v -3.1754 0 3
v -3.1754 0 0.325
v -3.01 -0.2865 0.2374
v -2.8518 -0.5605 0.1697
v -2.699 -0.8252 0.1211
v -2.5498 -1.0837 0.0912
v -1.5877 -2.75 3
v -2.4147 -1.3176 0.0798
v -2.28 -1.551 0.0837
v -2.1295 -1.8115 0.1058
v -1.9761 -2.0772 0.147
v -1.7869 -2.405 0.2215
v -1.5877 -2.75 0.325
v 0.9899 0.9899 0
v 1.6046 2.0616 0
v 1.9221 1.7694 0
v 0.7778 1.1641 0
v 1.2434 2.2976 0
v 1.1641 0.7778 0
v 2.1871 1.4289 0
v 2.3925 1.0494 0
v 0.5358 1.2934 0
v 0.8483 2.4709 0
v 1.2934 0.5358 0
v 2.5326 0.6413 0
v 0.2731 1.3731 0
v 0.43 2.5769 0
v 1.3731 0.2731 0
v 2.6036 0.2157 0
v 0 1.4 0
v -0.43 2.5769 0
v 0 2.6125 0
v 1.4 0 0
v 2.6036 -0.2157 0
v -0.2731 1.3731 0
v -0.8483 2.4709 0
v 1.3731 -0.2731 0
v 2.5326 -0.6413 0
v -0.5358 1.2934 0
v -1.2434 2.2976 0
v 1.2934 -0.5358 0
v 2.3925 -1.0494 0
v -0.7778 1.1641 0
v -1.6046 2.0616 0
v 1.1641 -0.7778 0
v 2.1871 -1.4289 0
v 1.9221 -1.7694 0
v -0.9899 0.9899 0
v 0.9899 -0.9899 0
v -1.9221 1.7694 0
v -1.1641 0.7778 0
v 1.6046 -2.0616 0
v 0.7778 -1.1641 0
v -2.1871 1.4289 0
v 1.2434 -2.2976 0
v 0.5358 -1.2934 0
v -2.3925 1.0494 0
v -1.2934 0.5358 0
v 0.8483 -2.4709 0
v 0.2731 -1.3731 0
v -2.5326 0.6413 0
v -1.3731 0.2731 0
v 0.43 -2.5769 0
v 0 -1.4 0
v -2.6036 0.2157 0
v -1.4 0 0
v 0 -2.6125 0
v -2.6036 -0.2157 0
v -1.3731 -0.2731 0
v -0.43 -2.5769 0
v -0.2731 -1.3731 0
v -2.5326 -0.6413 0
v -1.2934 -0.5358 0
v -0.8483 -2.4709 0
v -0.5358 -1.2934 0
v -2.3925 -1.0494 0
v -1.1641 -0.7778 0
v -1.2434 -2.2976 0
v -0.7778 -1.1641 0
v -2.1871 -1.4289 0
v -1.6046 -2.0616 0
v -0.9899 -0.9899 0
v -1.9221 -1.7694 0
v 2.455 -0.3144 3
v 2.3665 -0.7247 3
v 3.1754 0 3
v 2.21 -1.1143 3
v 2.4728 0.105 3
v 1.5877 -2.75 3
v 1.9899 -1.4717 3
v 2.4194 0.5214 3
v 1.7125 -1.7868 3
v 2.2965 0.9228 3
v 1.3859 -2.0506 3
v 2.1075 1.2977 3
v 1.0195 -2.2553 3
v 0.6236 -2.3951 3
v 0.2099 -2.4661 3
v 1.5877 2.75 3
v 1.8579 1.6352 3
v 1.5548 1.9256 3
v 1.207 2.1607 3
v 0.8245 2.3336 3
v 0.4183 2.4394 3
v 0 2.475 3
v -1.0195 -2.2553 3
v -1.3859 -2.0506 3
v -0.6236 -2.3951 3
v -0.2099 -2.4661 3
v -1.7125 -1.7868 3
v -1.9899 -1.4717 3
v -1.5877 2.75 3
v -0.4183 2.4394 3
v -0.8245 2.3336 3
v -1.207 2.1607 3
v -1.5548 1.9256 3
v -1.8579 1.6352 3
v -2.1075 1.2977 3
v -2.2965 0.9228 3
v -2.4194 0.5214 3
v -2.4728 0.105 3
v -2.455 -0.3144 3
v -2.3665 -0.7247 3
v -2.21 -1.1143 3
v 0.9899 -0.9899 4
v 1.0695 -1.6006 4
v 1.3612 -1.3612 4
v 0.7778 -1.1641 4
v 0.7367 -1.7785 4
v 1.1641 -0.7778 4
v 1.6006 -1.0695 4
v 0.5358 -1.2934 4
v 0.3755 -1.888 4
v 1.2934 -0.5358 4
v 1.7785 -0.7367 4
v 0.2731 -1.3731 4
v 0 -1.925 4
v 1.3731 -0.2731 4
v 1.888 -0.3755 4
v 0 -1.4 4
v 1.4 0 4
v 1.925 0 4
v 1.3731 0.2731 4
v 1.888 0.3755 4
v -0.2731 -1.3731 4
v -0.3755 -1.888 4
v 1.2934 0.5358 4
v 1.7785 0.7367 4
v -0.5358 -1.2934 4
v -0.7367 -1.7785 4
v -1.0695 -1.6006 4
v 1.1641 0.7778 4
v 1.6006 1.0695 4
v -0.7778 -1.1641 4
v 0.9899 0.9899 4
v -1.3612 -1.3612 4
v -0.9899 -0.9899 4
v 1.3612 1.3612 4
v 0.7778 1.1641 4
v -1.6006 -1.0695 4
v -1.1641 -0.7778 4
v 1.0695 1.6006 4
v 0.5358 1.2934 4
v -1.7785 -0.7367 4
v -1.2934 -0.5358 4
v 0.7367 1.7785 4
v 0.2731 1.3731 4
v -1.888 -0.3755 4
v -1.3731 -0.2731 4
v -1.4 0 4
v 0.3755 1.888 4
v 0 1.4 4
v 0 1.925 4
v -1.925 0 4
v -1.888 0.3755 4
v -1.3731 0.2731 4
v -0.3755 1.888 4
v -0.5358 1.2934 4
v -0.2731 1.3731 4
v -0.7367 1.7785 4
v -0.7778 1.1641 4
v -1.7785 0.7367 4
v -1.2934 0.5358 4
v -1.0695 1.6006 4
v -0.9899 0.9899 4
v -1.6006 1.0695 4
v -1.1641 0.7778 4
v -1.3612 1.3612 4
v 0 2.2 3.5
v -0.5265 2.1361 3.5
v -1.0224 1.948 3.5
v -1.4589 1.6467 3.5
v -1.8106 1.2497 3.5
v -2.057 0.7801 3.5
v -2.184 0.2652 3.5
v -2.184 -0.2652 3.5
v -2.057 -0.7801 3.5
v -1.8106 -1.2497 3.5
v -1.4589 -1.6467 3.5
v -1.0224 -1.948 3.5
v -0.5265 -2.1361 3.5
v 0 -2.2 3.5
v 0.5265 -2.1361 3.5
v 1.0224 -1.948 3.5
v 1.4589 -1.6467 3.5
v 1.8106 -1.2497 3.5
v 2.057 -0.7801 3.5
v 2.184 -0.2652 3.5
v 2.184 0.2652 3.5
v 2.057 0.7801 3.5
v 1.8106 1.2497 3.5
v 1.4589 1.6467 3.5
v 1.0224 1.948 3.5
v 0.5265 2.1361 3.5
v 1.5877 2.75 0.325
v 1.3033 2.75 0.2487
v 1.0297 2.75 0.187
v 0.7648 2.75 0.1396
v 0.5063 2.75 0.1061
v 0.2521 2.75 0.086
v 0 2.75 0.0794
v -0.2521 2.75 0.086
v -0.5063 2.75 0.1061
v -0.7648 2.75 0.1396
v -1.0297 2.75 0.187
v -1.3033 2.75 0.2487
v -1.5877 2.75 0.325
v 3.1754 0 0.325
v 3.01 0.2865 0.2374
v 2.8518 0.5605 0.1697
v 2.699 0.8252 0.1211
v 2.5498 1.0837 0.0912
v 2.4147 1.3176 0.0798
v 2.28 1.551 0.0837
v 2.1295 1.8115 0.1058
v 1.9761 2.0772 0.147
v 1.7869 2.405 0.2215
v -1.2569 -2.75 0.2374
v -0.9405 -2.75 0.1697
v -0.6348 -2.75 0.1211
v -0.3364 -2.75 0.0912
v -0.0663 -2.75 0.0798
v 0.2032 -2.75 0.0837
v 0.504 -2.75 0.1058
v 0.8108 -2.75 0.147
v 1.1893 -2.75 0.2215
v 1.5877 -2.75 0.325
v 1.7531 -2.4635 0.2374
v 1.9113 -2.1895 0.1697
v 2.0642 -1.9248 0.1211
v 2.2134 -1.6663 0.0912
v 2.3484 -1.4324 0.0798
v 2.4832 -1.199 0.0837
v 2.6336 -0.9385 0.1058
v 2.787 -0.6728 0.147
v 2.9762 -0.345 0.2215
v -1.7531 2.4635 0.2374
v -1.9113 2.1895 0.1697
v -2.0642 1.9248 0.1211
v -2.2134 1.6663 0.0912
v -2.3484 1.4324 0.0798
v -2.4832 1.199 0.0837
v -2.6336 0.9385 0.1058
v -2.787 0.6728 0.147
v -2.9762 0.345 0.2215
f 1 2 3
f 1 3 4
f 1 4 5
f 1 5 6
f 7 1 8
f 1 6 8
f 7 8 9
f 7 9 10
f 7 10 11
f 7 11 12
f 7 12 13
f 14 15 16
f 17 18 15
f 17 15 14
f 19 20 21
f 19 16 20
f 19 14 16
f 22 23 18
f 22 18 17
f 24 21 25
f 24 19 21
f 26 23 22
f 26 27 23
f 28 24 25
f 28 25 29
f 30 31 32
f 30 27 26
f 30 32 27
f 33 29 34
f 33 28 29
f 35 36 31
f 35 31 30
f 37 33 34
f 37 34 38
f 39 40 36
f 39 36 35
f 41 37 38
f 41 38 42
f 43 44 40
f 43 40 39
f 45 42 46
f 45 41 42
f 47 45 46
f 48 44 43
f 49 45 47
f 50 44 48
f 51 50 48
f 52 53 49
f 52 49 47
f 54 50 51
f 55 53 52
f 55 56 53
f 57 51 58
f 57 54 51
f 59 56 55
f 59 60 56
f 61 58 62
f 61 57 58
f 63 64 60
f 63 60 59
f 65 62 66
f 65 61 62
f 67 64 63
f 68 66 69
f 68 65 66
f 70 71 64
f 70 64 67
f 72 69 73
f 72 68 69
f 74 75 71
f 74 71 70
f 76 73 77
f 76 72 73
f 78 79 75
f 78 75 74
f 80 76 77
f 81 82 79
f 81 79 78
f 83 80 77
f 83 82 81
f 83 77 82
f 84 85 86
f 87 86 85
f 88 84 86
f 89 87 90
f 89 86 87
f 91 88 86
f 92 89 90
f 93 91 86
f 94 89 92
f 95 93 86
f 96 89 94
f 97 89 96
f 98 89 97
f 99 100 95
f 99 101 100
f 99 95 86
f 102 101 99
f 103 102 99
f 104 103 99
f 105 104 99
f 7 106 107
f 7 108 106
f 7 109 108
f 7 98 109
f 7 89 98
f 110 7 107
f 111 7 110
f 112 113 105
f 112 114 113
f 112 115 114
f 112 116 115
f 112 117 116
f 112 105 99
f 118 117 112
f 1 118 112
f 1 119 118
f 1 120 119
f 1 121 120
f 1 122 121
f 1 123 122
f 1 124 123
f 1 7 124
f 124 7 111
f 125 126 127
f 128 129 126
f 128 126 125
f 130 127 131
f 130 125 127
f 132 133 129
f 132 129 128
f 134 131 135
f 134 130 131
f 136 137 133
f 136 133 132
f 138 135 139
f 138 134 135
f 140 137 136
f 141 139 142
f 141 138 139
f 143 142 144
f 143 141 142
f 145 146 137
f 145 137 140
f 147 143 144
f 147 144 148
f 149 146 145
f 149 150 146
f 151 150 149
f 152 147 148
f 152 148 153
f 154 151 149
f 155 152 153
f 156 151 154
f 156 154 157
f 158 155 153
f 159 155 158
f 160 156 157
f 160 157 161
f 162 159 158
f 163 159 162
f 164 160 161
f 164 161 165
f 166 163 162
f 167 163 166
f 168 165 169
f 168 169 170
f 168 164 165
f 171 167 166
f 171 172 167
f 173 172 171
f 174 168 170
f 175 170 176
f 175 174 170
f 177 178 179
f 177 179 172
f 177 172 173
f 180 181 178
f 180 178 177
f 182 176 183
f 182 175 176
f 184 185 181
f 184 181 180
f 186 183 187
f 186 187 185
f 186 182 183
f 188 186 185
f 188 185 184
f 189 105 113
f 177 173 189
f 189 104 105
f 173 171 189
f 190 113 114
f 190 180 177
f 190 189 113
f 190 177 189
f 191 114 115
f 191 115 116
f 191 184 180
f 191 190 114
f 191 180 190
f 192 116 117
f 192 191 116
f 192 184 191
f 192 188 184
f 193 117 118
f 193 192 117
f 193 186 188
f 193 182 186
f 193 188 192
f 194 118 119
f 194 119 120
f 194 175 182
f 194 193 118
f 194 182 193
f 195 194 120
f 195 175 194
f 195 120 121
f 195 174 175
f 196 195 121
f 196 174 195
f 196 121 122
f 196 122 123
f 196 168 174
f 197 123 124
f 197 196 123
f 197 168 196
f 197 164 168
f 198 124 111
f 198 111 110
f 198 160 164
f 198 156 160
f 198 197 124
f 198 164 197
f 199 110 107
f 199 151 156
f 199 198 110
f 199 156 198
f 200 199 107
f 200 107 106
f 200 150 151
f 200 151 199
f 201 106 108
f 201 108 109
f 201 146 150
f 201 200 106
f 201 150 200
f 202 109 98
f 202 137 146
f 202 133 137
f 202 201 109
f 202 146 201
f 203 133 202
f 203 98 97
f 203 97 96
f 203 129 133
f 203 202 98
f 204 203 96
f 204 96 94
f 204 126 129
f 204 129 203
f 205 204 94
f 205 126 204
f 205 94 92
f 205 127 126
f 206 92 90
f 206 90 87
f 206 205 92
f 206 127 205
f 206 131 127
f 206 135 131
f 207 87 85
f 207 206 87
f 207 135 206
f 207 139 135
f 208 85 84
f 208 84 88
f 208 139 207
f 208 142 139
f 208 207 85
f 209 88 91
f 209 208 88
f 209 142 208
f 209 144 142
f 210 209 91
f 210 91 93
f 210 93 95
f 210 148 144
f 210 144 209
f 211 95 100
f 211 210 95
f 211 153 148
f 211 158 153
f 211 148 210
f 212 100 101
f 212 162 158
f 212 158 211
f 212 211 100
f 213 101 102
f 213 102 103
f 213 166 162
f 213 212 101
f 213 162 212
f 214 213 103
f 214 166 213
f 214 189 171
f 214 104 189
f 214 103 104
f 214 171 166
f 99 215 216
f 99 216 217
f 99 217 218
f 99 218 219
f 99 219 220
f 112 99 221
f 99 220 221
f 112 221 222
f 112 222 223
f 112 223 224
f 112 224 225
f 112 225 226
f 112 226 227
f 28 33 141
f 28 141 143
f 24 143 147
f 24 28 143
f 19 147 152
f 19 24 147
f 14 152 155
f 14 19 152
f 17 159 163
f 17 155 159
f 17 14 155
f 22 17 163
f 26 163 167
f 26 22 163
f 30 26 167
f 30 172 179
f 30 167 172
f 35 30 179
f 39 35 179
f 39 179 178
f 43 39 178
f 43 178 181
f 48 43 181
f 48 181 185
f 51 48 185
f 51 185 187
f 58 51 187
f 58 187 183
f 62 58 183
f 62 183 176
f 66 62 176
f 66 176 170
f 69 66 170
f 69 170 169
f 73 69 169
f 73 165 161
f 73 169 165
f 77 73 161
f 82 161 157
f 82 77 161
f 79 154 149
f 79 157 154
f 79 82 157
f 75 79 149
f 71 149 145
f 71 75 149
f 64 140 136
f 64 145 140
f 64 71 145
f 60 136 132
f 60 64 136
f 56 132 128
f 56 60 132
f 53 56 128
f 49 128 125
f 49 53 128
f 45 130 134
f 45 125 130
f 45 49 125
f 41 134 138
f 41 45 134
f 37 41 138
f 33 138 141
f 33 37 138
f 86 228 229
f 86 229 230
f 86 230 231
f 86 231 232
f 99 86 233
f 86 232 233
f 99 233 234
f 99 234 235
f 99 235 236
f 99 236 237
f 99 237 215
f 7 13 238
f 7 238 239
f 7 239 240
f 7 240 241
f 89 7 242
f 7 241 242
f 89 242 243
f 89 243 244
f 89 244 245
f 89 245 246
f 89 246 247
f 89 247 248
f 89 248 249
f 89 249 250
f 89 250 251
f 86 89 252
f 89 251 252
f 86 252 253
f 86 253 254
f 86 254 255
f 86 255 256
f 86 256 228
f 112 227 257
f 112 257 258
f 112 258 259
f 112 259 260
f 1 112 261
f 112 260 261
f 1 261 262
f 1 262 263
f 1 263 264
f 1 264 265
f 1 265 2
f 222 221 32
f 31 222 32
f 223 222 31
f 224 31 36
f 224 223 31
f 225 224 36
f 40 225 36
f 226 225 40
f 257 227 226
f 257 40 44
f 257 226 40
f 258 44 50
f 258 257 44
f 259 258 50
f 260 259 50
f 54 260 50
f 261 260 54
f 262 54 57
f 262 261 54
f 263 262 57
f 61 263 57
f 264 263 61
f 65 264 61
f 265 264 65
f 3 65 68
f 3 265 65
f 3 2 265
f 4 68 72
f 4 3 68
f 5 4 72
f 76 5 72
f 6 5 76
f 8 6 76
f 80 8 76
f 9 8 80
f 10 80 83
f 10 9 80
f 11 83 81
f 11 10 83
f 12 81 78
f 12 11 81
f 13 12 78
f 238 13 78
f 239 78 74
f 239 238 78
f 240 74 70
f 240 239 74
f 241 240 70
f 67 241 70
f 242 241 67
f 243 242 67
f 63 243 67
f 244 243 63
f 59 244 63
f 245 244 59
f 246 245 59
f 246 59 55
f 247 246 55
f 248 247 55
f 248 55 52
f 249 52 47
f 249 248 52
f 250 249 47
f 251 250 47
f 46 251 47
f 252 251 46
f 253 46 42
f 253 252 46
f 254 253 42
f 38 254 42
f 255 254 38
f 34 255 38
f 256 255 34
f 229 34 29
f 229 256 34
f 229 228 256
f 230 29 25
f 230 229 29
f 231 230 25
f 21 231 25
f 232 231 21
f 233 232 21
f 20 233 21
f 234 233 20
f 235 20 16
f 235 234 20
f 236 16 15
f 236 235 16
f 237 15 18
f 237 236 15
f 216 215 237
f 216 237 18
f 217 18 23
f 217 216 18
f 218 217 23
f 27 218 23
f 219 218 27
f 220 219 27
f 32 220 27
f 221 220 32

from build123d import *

# Parameters (mm, degrees)
F_0186_EXTRUDE_DEPTH        = 3
F_0186_EXTRUDE_ROTATE_ANGLE = 120
F_0185_REVOLVE_ROTATE_ANGLE = 90
F_0188_CONE_ROTATE_ANGLE    = 90
F_0191_CYLINDER_SKETCH_R    = 1.4
F_0191_CYLINDER_DEPTH       = 10


with BuildPart() as part:
    # 0186_extrude_Sketch → 0186_extrude (new body)
    with BuildSketch(Plane.XY):
        Polygon((0, 0), (3.175426481, 0), (4.763139721, 2.75), (3.175426481, 5.5), (0, 5.5), (-1.58771324, 2.75), align=None)
    extrude(amount=F_0186_EXTRUDE_DEPTH)


with BuildPart() as part_1:
    # 0186_extrude_Rotate: moved
    add(part.part.rotate(Axis((0, 0, 0), (0, 0, 1)), F_0186_EXTRUDE_ROTATE_ANGLE))


with BuildPart() as part_2:
    # 0186_extrude_Translate: moved
    add(part_1.part.moved(Location((3.175426481, 0, 0))))


with BuildPart() as body_2:
    # 0185_revolve_Sketch → 0185_revolve (revolve)
    with BuildSketch(Plane.XY, mode=Mode.PRIVATE) as f_0185_revolve_sk:
        Polygon((0, 0), (2.6125, 0), (3.675426481, 0.61368089), (3.675426481, 3), (0, 3), align=None)
    revolve(f_0185_revolve_sk.sketch.rotate(Axis((0, -100, 0), (0, 1, 0)), 90), axis=Axis((0, -100, 0), (0, 1, 0)))


with BuildPart() as body_2_1:
    # 0185_revolve_Rotate: moved
    add(body_2.part.rotate(Axis((0, 0, 0), (1, 0, 0)), F_0185_REVOLVE_ROTATE_ANGLE))


with BuildPart() as part_3:
    add(part_2.part)

    # 0187_common: intersect body 2
    add(body_2_1.part, mode=Mode.INTERSECT)


with BuildPart() as body_2_2:
    # 0188_cone_Sketch → 0188_cone (revolve)
    with BuildSketch(Plane.XY, mode=Mode.PRIVATE) as f_0188_cone_sk:
        Polygon((0, 0), (2.475, 0), (1.925, 1), (0, 1), align=None)
    revolve(f_0188_cone_sk.sketch.rotate(Axis((0, -100, 0), (0, 1, 0)), 90), axis=Axis((0, -100, 0), (0, 1, 0)))


with BuildPart() as body_2_2_1:
    # 0188_cone_Rotate: moved
    add(body_2_2.part.rotate(Axis((0, 0, 0), (1, 0, 0)), F_0188_CONE_ROTATE_ANGLE))


with BuildPart() as body_2_2_2:
    # 0188_cone_Translate: moved
    add(body_2_2_1.part.moved(Location((0, 0, 3))))


with BuildPart() as part_4:
    add(part_3.part)

    # 0190_add: union body 2 2
    add(body_2_2_2.part)


with BuildPart() as body_2_3:
    # 0191_cylinder_Sketch → 0191_cylinder (new body)
    with BuildSketch(Plane.XY):
        Circle(F_0191_CYLINDER_SKETCH_R)
    extrude(amount=F_0191_CYLINDER_DEPTH)


with BuildPart() as body_2_3_1:
    # 0191_cylinder_Translate: moved
    add(body_2_3.part.moved(Location((0, 0, -5))))


with BuildPart() as part_5:
    add(part_4.part)

    # 0192_sub: cut body 2 3
    add(body_2_3_1.part, mode=Mode.SUBTRACT)


solid = part_5.part
